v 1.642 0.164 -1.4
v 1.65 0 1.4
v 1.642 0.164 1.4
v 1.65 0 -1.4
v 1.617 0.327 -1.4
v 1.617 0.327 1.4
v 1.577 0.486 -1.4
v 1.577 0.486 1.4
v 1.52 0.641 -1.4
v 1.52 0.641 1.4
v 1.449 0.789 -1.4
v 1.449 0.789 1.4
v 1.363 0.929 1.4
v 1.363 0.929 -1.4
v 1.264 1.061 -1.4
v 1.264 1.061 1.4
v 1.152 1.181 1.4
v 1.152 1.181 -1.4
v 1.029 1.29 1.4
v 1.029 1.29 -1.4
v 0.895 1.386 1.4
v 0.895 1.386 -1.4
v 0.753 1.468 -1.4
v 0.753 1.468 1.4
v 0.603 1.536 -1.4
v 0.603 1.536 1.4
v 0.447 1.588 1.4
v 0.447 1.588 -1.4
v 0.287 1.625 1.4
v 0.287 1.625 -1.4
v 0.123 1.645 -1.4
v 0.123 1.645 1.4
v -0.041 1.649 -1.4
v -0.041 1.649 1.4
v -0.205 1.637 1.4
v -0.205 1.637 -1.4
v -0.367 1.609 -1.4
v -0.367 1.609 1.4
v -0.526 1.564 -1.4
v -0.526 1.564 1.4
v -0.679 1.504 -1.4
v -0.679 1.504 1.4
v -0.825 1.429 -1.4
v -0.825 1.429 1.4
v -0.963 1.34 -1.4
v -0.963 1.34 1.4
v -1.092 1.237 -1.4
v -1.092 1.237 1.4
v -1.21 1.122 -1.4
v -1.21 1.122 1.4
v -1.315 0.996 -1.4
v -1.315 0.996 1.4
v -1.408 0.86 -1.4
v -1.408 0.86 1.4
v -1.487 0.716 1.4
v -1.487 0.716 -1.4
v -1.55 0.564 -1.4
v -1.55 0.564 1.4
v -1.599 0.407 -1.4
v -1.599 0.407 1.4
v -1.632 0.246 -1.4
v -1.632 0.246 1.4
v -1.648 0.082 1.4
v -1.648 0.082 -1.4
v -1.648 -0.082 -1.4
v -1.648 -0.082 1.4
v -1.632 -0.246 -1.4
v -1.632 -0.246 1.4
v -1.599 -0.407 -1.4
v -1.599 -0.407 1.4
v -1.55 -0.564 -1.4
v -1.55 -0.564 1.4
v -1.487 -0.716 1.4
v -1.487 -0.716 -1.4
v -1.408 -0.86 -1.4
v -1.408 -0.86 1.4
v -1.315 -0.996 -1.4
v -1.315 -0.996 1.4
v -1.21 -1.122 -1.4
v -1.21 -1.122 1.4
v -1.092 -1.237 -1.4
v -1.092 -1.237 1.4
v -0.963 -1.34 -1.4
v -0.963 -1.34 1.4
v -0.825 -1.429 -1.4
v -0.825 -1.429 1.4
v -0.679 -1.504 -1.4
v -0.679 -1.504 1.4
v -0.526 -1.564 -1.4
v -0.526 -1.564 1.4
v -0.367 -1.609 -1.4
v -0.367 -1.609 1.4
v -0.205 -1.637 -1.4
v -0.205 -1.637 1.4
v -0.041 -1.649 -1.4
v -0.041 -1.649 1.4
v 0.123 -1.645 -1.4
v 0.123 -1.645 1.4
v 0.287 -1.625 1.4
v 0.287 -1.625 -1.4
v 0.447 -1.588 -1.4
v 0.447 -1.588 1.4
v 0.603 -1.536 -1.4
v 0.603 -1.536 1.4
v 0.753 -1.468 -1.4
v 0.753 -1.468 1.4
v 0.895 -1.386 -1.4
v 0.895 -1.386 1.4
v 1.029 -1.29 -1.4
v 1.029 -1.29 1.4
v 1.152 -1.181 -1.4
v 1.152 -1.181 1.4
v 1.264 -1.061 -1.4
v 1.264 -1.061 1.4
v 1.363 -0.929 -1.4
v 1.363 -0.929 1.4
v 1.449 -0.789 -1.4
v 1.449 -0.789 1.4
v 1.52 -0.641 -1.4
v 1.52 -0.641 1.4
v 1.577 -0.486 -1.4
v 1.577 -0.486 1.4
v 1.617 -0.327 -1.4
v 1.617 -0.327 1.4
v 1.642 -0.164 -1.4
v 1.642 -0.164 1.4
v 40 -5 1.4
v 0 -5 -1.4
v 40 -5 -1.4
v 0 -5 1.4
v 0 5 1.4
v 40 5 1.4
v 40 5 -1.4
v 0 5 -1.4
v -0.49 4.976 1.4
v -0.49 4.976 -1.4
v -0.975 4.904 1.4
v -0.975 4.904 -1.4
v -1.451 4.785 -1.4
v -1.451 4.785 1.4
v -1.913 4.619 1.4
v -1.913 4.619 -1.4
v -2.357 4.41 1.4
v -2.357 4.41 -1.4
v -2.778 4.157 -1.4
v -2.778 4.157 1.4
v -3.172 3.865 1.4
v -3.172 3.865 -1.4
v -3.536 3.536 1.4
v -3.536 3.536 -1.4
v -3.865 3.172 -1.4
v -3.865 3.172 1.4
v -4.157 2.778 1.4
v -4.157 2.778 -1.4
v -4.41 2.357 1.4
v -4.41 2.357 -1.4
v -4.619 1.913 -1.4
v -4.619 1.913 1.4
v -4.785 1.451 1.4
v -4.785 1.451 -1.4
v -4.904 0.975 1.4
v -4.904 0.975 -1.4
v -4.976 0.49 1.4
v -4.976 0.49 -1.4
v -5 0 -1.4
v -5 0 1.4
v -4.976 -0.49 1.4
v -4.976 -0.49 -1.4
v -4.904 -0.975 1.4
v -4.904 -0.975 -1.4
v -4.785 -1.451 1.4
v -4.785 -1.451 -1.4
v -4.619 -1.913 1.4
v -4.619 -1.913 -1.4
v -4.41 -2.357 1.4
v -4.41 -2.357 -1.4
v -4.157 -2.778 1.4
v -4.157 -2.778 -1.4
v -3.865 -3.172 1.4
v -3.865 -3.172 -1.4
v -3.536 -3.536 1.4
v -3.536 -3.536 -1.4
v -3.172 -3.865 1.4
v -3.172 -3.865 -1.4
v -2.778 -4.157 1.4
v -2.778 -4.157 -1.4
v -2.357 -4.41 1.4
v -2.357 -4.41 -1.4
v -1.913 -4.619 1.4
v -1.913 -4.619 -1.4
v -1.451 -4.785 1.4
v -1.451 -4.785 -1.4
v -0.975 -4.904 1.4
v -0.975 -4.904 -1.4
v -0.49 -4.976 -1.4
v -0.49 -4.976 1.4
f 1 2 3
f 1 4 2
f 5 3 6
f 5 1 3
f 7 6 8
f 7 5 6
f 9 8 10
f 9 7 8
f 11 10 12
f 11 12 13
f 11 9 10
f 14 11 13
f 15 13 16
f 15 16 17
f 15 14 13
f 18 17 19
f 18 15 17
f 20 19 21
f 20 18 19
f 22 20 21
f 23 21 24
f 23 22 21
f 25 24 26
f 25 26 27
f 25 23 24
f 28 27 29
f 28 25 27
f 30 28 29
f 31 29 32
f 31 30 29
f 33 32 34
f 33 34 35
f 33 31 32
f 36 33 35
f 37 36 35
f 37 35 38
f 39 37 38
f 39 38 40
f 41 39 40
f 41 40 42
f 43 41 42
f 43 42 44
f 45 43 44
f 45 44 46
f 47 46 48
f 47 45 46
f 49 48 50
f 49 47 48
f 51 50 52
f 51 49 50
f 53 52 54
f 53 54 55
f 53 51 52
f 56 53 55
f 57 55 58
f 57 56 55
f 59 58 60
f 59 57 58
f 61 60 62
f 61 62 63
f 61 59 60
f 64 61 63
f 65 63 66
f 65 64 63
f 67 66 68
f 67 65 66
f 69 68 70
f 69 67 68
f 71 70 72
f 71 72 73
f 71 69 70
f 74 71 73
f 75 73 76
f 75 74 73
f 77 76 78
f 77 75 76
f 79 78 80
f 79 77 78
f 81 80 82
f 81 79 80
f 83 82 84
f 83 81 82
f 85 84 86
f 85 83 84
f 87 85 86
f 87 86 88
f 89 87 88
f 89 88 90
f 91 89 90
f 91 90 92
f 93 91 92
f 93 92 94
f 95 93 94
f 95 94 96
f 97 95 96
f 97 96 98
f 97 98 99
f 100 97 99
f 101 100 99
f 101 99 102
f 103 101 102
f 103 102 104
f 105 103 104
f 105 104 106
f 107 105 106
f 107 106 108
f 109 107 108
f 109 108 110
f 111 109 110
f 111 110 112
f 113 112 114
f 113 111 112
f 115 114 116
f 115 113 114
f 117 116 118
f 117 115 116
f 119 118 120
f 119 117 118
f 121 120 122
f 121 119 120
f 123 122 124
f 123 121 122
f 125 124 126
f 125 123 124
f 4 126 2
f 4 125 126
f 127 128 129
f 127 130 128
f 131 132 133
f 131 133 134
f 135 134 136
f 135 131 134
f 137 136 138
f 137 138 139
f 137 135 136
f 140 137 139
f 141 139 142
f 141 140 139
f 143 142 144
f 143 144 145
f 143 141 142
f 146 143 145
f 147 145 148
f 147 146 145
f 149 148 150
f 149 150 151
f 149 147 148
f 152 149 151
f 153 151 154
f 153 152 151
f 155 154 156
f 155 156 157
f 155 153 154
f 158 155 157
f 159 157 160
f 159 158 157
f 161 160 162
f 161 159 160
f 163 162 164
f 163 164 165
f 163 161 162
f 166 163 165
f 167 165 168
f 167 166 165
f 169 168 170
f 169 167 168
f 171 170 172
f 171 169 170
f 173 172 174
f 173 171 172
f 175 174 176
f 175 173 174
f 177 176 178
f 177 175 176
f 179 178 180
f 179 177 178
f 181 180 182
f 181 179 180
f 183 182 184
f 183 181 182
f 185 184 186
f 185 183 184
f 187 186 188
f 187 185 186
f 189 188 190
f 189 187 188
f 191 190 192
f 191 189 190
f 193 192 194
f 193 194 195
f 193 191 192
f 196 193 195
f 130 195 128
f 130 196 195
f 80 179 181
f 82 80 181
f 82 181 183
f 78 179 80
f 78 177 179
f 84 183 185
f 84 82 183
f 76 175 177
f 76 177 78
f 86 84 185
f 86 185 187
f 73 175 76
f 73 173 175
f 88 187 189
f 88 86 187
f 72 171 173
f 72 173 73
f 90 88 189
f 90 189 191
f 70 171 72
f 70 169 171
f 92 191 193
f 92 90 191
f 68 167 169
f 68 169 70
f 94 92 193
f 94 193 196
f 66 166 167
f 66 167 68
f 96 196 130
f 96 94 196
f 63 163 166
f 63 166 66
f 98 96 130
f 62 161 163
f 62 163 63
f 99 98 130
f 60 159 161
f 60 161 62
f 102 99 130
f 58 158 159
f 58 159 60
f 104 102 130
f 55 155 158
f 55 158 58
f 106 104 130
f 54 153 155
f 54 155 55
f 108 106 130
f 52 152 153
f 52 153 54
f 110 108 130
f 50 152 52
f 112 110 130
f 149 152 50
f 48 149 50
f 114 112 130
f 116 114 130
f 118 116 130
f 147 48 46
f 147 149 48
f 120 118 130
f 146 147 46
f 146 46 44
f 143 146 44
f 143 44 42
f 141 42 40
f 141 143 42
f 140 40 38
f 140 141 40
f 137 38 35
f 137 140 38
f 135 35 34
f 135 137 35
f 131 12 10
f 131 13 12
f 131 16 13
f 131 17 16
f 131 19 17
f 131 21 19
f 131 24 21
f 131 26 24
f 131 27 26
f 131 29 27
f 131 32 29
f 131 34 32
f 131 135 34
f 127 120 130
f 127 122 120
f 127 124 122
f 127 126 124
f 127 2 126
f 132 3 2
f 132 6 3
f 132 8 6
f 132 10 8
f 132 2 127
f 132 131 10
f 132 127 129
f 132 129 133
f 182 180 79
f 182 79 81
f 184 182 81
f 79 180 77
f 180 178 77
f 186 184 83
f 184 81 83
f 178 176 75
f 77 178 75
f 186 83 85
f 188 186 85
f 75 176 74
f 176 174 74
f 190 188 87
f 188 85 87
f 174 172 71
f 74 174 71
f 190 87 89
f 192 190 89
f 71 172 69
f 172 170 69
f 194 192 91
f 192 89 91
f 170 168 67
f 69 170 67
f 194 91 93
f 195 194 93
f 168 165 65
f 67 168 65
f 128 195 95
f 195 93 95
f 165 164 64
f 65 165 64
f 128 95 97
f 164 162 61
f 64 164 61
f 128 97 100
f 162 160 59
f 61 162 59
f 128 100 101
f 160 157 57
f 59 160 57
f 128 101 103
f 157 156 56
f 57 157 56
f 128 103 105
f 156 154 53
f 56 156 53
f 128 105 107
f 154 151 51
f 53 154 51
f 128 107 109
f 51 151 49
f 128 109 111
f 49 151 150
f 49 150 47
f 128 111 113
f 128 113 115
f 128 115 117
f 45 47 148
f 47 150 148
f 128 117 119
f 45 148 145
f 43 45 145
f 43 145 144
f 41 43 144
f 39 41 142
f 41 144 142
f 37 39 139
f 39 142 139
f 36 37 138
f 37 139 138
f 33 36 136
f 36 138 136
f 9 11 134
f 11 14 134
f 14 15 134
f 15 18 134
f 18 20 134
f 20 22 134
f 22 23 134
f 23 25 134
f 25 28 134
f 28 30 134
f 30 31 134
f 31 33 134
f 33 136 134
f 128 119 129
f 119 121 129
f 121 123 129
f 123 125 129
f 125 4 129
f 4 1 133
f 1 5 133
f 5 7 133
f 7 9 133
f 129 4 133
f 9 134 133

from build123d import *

# Parameters (mm, degrees)
ESQUISSE1_R        = 1.65
BOSS_EXTRU_1_DEPTH = 1.4


with BuildPart() as part:
    # Esquisse1 → Boss.-Extru.1 (new, symmetric)
    with BuildSketch(Plane.XY):
        with BuildLine():
            Line((0, -5), (40, -5))
            Line((40, -5), (40, 5))
            Line((40, 5), (0, 5))
            ThreePointArc((0, 5), (-5, 0), (0, -5))
        make_face()
        Circle(ESQUISSE1_R, mode=Mode.SUBTRACT)
    extrude(amount=BOSS_EXTRU_1_DEPTH, both=True)


solid = part.part
